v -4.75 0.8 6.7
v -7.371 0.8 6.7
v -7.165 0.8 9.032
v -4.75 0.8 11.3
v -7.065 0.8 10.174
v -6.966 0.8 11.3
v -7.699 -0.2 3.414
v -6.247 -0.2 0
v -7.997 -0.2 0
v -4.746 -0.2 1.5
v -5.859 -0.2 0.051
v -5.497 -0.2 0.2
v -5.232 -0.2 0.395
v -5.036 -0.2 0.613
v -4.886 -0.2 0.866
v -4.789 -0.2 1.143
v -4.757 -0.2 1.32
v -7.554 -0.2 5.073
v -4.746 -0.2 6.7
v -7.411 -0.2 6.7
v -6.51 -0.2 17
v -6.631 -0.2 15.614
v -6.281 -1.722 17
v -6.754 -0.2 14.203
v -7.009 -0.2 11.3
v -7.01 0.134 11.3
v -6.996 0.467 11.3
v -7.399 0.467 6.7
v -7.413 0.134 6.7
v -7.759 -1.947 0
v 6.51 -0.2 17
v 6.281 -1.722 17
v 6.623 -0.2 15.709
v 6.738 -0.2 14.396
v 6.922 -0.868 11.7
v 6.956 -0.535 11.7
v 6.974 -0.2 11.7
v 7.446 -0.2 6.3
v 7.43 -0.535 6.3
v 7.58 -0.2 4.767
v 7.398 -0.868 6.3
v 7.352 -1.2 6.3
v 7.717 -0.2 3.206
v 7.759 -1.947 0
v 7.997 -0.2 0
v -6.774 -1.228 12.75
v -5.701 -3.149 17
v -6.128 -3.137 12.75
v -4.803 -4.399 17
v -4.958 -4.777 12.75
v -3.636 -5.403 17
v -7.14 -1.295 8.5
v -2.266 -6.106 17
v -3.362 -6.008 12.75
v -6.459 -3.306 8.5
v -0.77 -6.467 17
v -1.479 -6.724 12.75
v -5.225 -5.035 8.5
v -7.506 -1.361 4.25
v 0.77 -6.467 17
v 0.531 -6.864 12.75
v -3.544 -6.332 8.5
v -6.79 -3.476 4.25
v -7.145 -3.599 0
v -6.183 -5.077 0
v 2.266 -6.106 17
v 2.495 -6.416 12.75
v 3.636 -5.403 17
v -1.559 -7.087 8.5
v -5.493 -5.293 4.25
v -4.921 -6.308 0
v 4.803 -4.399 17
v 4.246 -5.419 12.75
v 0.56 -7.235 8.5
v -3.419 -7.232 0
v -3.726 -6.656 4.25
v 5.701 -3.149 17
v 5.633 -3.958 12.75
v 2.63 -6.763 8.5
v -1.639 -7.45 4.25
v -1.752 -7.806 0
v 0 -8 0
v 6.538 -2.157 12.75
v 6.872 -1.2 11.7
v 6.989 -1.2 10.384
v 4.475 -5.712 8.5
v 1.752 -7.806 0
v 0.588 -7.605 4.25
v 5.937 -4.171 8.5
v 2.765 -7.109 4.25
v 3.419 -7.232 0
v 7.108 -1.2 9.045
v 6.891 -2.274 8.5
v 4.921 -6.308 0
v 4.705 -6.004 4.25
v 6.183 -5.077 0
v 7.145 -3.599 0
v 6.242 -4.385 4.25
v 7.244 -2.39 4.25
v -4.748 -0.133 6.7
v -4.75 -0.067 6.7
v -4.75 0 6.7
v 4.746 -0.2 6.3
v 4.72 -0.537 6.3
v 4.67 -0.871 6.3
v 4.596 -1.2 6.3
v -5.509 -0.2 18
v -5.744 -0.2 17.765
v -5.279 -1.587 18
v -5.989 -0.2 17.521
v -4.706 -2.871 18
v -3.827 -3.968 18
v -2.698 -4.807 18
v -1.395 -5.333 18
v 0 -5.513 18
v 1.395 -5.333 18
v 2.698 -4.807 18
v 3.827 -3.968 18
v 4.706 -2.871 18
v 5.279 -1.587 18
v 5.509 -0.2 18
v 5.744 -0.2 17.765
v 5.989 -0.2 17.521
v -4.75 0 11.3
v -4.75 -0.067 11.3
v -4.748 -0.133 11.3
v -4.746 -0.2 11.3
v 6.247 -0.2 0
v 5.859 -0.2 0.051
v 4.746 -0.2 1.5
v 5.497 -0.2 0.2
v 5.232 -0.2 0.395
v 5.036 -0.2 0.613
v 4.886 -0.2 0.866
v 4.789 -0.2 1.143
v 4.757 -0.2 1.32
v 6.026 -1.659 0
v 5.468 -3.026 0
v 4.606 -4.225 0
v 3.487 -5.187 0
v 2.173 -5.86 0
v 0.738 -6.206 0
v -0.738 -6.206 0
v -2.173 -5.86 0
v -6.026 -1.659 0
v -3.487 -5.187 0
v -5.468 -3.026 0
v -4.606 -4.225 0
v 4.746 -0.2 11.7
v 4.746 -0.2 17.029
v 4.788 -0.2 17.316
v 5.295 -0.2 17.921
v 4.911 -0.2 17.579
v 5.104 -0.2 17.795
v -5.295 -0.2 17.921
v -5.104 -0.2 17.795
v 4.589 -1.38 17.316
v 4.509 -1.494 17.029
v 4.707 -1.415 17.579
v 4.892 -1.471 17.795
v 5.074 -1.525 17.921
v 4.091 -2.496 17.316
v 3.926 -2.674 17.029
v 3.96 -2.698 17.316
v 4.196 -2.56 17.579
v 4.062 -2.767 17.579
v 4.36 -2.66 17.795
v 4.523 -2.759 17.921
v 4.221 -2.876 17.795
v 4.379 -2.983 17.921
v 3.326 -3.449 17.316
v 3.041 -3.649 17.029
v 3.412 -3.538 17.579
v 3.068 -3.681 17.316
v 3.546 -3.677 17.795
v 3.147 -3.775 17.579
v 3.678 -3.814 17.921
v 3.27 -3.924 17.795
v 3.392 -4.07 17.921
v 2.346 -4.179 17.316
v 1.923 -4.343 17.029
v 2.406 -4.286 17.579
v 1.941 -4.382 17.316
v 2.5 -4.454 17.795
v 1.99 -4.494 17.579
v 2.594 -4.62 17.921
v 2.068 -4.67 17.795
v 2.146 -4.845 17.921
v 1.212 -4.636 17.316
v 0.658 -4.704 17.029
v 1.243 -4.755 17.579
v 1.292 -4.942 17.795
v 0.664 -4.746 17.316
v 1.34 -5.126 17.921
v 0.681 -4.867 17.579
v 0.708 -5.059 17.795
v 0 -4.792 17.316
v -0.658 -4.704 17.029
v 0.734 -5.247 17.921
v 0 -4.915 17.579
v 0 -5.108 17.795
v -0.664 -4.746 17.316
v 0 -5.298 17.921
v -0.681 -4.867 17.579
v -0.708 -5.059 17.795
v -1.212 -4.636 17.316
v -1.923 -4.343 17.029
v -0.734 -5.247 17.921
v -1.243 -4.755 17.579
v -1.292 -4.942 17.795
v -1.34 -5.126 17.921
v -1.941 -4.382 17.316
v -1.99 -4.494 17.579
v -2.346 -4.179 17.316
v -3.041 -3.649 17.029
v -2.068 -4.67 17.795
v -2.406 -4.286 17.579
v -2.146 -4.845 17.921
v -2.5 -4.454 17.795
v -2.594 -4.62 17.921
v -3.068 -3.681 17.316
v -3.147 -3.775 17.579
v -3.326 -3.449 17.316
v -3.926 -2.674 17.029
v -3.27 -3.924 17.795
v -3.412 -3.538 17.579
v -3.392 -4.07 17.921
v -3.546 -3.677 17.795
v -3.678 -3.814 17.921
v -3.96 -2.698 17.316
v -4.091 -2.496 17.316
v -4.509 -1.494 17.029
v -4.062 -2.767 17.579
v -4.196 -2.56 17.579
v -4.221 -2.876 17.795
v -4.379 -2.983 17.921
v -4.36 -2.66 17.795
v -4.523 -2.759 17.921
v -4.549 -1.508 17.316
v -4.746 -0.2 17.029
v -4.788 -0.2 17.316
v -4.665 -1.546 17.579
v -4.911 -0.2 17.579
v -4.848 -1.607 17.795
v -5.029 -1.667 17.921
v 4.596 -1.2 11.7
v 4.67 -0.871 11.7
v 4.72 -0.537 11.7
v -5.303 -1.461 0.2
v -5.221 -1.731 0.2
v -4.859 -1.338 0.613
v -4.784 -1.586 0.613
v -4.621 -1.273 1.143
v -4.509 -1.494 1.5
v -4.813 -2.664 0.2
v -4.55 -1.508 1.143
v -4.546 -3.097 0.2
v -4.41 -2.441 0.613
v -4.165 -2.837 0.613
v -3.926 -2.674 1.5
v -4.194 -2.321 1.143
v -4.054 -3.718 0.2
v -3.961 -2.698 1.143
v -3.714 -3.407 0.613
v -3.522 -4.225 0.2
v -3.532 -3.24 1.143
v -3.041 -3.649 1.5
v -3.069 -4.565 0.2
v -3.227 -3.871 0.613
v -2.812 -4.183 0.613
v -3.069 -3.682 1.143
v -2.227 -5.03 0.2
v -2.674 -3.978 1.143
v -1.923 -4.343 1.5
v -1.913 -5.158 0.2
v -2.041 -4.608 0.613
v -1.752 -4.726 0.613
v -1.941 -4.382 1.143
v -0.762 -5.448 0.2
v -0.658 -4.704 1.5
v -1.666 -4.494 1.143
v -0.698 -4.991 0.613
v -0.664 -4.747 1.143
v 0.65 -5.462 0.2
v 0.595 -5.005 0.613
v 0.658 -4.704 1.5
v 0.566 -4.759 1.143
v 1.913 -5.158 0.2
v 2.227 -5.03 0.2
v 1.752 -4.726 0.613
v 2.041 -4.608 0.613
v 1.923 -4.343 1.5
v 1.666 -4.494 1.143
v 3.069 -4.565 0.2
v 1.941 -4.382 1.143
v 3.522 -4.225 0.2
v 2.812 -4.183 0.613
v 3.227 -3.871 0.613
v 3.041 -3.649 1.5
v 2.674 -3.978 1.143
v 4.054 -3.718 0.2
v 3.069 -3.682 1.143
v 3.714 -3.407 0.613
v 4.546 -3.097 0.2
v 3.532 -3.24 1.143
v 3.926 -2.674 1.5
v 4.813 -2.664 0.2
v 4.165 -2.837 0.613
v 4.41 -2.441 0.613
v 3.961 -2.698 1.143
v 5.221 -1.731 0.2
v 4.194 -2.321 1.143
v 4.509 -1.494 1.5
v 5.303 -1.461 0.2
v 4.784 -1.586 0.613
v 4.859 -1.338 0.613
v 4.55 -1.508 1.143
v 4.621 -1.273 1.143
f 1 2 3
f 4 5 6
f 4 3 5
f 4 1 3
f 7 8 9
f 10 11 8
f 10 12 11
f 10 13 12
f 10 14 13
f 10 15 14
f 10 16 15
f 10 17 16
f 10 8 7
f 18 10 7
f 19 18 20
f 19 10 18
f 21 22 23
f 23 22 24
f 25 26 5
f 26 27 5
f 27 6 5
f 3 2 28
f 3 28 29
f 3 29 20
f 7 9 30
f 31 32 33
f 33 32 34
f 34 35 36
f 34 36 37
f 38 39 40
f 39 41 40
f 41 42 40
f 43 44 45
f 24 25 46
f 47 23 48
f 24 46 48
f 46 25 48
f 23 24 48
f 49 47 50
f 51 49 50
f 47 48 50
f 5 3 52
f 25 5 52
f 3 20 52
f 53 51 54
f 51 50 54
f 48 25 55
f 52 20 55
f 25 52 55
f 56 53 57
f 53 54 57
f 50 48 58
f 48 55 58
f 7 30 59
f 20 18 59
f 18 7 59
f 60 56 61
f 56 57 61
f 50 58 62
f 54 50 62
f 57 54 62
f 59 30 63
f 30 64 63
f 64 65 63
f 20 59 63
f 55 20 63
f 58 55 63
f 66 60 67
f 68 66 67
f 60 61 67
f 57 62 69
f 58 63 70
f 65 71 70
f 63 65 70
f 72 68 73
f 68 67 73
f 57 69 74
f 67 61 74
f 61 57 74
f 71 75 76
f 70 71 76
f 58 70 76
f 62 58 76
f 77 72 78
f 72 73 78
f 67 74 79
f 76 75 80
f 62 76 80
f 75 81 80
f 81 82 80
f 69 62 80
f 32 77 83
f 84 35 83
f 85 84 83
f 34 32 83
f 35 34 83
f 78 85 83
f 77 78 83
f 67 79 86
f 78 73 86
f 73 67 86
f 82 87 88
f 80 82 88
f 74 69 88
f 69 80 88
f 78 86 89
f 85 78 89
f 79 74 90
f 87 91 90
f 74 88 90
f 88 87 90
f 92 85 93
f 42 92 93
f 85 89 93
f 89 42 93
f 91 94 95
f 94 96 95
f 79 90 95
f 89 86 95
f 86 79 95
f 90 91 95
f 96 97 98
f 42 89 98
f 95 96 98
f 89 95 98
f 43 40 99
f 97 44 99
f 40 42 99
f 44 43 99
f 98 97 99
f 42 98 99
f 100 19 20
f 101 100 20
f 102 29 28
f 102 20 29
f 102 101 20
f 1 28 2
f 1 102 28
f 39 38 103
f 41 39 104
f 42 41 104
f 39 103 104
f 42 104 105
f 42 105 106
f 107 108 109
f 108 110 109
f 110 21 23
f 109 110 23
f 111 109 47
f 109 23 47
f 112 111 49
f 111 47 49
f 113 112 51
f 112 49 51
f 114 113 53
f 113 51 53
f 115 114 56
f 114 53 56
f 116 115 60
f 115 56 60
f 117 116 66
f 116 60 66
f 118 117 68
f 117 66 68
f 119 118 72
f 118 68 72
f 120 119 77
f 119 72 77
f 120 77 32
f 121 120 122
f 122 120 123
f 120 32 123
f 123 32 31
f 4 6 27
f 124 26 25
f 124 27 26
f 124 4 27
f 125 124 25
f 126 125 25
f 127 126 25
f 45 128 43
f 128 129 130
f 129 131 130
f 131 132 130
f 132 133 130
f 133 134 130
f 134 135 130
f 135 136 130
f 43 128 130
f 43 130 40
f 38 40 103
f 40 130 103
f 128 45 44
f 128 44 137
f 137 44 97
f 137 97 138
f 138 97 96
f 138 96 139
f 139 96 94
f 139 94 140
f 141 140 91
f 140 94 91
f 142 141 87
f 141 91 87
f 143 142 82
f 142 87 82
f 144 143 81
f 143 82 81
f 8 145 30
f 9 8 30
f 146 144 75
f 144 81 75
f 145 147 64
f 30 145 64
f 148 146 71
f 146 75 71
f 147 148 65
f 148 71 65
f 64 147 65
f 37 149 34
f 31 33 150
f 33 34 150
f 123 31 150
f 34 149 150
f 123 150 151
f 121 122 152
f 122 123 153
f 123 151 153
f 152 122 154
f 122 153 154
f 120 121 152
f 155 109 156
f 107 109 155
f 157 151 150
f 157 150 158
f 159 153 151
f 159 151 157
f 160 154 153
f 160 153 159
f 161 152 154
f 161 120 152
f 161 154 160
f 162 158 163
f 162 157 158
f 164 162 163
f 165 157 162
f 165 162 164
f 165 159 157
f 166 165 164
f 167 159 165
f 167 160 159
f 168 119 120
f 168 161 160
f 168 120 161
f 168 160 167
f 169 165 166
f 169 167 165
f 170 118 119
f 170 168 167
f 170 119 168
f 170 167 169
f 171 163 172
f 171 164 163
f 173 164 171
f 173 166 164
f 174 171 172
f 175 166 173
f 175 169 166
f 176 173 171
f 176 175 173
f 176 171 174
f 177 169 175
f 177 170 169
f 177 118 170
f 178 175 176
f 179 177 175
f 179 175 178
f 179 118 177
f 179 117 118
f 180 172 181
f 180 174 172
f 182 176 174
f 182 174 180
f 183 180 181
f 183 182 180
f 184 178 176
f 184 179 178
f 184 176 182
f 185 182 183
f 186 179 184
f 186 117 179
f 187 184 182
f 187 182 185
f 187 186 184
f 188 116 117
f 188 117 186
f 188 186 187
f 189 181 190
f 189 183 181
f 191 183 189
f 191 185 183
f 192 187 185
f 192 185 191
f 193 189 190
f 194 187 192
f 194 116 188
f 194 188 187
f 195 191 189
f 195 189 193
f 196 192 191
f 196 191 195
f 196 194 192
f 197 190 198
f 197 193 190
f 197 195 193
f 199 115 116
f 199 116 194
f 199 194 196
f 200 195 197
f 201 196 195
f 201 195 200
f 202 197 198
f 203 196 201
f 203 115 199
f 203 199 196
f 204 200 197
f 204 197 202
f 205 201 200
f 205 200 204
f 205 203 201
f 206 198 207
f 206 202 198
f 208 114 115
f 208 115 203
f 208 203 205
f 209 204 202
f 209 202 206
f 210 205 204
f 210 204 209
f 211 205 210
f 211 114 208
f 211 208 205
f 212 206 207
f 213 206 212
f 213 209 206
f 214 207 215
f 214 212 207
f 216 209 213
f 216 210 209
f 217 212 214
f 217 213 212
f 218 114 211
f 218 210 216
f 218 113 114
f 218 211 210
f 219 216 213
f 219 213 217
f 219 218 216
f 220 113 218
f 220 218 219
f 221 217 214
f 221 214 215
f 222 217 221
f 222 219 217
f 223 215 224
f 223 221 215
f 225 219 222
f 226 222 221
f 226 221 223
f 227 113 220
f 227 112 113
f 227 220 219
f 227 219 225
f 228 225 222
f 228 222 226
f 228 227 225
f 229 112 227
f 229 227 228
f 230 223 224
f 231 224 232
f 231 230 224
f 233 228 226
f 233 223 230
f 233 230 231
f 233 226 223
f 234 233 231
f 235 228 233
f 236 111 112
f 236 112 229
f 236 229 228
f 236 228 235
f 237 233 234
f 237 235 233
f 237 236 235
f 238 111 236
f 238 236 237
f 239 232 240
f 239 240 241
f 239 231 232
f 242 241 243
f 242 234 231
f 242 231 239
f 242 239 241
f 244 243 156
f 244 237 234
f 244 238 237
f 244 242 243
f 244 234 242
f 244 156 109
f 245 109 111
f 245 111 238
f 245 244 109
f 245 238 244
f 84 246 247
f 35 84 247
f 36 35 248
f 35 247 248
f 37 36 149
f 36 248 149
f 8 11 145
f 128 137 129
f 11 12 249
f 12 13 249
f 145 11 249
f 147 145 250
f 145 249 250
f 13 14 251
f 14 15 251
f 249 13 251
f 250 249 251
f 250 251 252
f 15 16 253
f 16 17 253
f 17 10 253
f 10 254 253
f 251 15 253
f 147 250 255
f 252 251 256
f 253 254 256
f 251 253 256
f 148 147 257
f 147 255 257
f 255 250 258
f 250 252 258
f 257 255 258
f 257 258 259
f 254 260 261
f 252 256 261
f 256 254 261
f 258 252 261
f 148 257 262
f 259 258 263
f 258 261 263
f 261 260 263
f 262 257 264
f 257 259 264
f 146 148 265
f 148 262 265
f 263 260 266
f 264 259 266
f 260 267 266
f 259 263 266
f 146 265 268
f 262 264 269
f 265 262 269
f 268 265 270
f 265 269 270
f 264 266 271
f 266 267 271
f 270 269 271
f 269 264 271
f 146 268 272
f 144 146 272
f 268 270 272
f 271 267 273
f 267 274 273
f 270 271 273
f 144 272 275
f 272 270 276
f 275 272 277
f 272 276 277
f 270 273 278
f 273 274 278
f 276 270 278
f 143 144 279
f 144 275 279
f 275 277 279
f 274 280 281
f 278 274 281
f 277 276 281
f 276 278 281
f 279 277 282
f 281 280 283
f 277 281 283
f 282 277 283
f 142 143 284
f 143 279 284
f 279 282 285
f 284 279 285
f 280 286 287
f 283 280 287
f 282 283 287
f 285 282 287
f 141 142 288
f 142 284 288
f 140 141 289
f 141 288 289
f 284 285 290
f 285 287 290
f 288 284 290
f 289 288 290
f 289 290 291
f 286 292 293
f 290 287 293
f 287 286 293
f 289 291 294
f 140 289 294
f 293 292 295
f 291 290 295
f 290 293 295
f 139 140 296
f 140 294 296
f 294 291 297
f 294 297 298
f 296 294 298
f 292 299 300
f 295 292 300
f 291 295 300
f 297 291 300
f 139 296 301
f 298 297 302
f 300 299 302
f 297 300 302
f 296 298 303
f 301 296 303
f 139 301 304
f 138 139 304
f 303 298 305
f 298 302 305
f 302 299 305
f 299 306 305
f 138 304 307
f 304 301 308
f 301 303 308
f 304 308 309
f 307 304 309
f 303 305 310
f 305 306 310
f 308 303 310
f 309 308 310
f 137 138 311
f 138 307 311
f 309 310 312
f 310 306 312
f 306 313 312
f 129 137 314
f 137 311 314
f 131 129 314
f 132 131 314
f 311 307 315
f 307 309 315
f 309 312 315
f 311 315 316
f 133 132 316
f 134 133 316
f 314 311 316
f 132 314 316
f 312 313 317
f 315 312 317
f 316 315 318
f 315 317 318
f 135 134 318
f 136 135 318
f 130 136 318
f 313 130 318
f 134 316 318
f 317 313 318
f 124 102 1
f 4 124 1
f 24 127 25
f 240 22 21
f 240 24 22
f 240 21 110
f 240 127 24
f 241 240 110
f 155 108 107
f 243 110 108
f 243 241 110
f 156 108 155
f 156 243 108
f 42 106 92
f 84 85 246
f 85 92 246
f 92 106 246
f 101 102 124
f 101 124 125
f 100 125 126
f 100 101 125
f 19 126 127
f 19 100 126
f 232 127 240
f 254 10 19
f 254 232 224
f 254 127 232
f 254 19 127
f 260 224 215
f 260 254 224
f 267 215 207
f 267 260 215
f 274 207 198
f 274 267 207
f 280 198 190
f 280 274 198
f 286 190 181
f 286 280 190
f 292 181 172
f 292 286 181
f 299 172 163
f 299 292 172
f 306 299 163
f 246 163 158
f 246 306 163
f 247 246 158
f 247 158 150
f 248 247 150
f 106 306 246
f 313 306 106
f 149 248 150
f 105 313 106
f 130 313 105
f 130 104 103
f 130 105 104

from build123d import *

# Parameters (mm, degrees)
SKETCH3_R               = 4.75
WIRE_HOLE_CUT_DEPTH     = 22.260291625
FRONT_STRAIN_FILLET_R   = 1
REAR_STRAIN_FILLET_R    = 1.5
SPLIT_CUT_1_DEPTH       = 22.260291625
SPLIT_CUT_2_DEPTH       = 22.26029171
WIRE_INSERT_NOTCH_DEPTH = 22.259351006


with BuildPart() as part:
    # Sketch2 → Body Revolve1 (revolve)
    with BuildSketch(Plane(origin=(0, 0, 0), x_dir=(0, 0, -1), z_dir=(1, 0, 0)), mode=Mode.PRIVATE) as body_revolve1_sk:
        Polygon((0, 0), (-18, 0), (-18, 5.51269272), (-17, 6.51269272), (0, 8), align=None)
    revolve(body_revolve1_sk.sketch.rotate(Axis((0, 0, 18), (0, 0, 1)), 90), axis=Axis((0, 0, 18), (0, 0, 1)))

    # Sketch3 → Wire Hole Cut (cut, through all)
    with BuildSketch(Plane.XY):
        Circle(SKETCH3_R)
    extrude(amount=WIRE_HOLE_CUT_DEPTH, mode=Mode.SUBTRACT)

    # Front Strain Fillet
    # the kernel refuses this fillet: 1 mm, written as the material it takes off along each edge
    with BuildSketch(Plane(origin=(0, 0, 18), x_dir=(1, 0, 0), z_dir=(0, 1, 0))) as front_strain_fillet_piece_1:
        with BuildLine():
            CenterArc((5.75, 0.971434637), FRONT_STRAIN_FILLET_R, 180, 76.272331842)
            Line((4.75, 0.971434637), (4.73, 0.971434637))
            Line((4.73, 0.971434637), (4.73, 0))
            Line((4.73, 0), (4.75, -0.02))
            ThreePointArc((4.75, -0.02), (5.13134636, -0.02), (5.507946574, -0.019428693))
            Line((5.507946574, -0.019428693), (5.51269272, 0))
        make_face()
    revolve(axis=Axis((0, 0, 18), (0, 0, -1)), mode=Mode.SUBTRACT)

    # Rear Strain Fillet
    rear_strain_fillet_edges = [part.edges().sort_by_distance(p)[0] for p in [
        (-4.75, 0, 0),
    ]]
    fillet(rear_strain_fillet_edges, radius=REAR_STRAIN_FILLET_R)

    # Sketch5 → Split Cut 1 (cut, through all)
    with BuildSketch(Plane(origin=(0, 0, 0), x_dir=(0, 0, -1), z_dir=(1, 0, 0))):
        Polygon((-18, 0), (-11.5, 0), (-11.5, 1), (-6.5, 1), (-6.5, 0), (0, 0), (0, -0.2), (-6.7, -0.2), (-6.7, 0.8), (-11.3, 0.8), (-11.3, -0.2), (-18, -0.2), align=None)
    extrude(amount=-SPLIT_CUT_1_DEPTH, mode=Mode.SUBTRACT)

    # Sketch7 → Split Cut 2 (cut, through all)
    with BuildSketch(Plane(origin=(0, 0, 0), x_dir=(0, 0, -1), z_dir=(1, 0, 0))):
        Polygon((-18, 0), (-11.5, 0), (-11.5, -1), (-6.5, -1), (-6.5, 0), (0, 0), (0, -0.2), (-6.3, -0.2), (-6.3, -1.2), (-11.7, -1.2), (-11.7, -0.2), (-18, -0.2), align=None)
    extrude(amount=SPLIT_CUT_2_DEPTH, mode=Mode.SUBTRACT)


with BuildPart() as split_cut_2_kept_piece:
    # of the separate pieces the step leaves, the one the design keeps (split_cut_2_pieces_kept)
    add(part.part.solids().sort_by_distance((6.24679918, -0.2, 0))[0])

    # Sketch6 → Wire Insert Notch (cut, through all)
    with BuildSketch(Plane.XY):
        with BuildLine():
            Line((-4.75, 0), (-4.75, 2))
            Line((-4.75, 2), (4.75, 2))
            Line((4.75, 2), (4.75, 0))
            ThreePointArc((4.75, 0), (0, -4.75), (-4.75, 0))
        make_face()
    extrude(amount=WIRE_INSERT_NOTCH_DEPTH, mode=Mode.SUBTRACT)


solid = split_cut_2_kept_piece.part
